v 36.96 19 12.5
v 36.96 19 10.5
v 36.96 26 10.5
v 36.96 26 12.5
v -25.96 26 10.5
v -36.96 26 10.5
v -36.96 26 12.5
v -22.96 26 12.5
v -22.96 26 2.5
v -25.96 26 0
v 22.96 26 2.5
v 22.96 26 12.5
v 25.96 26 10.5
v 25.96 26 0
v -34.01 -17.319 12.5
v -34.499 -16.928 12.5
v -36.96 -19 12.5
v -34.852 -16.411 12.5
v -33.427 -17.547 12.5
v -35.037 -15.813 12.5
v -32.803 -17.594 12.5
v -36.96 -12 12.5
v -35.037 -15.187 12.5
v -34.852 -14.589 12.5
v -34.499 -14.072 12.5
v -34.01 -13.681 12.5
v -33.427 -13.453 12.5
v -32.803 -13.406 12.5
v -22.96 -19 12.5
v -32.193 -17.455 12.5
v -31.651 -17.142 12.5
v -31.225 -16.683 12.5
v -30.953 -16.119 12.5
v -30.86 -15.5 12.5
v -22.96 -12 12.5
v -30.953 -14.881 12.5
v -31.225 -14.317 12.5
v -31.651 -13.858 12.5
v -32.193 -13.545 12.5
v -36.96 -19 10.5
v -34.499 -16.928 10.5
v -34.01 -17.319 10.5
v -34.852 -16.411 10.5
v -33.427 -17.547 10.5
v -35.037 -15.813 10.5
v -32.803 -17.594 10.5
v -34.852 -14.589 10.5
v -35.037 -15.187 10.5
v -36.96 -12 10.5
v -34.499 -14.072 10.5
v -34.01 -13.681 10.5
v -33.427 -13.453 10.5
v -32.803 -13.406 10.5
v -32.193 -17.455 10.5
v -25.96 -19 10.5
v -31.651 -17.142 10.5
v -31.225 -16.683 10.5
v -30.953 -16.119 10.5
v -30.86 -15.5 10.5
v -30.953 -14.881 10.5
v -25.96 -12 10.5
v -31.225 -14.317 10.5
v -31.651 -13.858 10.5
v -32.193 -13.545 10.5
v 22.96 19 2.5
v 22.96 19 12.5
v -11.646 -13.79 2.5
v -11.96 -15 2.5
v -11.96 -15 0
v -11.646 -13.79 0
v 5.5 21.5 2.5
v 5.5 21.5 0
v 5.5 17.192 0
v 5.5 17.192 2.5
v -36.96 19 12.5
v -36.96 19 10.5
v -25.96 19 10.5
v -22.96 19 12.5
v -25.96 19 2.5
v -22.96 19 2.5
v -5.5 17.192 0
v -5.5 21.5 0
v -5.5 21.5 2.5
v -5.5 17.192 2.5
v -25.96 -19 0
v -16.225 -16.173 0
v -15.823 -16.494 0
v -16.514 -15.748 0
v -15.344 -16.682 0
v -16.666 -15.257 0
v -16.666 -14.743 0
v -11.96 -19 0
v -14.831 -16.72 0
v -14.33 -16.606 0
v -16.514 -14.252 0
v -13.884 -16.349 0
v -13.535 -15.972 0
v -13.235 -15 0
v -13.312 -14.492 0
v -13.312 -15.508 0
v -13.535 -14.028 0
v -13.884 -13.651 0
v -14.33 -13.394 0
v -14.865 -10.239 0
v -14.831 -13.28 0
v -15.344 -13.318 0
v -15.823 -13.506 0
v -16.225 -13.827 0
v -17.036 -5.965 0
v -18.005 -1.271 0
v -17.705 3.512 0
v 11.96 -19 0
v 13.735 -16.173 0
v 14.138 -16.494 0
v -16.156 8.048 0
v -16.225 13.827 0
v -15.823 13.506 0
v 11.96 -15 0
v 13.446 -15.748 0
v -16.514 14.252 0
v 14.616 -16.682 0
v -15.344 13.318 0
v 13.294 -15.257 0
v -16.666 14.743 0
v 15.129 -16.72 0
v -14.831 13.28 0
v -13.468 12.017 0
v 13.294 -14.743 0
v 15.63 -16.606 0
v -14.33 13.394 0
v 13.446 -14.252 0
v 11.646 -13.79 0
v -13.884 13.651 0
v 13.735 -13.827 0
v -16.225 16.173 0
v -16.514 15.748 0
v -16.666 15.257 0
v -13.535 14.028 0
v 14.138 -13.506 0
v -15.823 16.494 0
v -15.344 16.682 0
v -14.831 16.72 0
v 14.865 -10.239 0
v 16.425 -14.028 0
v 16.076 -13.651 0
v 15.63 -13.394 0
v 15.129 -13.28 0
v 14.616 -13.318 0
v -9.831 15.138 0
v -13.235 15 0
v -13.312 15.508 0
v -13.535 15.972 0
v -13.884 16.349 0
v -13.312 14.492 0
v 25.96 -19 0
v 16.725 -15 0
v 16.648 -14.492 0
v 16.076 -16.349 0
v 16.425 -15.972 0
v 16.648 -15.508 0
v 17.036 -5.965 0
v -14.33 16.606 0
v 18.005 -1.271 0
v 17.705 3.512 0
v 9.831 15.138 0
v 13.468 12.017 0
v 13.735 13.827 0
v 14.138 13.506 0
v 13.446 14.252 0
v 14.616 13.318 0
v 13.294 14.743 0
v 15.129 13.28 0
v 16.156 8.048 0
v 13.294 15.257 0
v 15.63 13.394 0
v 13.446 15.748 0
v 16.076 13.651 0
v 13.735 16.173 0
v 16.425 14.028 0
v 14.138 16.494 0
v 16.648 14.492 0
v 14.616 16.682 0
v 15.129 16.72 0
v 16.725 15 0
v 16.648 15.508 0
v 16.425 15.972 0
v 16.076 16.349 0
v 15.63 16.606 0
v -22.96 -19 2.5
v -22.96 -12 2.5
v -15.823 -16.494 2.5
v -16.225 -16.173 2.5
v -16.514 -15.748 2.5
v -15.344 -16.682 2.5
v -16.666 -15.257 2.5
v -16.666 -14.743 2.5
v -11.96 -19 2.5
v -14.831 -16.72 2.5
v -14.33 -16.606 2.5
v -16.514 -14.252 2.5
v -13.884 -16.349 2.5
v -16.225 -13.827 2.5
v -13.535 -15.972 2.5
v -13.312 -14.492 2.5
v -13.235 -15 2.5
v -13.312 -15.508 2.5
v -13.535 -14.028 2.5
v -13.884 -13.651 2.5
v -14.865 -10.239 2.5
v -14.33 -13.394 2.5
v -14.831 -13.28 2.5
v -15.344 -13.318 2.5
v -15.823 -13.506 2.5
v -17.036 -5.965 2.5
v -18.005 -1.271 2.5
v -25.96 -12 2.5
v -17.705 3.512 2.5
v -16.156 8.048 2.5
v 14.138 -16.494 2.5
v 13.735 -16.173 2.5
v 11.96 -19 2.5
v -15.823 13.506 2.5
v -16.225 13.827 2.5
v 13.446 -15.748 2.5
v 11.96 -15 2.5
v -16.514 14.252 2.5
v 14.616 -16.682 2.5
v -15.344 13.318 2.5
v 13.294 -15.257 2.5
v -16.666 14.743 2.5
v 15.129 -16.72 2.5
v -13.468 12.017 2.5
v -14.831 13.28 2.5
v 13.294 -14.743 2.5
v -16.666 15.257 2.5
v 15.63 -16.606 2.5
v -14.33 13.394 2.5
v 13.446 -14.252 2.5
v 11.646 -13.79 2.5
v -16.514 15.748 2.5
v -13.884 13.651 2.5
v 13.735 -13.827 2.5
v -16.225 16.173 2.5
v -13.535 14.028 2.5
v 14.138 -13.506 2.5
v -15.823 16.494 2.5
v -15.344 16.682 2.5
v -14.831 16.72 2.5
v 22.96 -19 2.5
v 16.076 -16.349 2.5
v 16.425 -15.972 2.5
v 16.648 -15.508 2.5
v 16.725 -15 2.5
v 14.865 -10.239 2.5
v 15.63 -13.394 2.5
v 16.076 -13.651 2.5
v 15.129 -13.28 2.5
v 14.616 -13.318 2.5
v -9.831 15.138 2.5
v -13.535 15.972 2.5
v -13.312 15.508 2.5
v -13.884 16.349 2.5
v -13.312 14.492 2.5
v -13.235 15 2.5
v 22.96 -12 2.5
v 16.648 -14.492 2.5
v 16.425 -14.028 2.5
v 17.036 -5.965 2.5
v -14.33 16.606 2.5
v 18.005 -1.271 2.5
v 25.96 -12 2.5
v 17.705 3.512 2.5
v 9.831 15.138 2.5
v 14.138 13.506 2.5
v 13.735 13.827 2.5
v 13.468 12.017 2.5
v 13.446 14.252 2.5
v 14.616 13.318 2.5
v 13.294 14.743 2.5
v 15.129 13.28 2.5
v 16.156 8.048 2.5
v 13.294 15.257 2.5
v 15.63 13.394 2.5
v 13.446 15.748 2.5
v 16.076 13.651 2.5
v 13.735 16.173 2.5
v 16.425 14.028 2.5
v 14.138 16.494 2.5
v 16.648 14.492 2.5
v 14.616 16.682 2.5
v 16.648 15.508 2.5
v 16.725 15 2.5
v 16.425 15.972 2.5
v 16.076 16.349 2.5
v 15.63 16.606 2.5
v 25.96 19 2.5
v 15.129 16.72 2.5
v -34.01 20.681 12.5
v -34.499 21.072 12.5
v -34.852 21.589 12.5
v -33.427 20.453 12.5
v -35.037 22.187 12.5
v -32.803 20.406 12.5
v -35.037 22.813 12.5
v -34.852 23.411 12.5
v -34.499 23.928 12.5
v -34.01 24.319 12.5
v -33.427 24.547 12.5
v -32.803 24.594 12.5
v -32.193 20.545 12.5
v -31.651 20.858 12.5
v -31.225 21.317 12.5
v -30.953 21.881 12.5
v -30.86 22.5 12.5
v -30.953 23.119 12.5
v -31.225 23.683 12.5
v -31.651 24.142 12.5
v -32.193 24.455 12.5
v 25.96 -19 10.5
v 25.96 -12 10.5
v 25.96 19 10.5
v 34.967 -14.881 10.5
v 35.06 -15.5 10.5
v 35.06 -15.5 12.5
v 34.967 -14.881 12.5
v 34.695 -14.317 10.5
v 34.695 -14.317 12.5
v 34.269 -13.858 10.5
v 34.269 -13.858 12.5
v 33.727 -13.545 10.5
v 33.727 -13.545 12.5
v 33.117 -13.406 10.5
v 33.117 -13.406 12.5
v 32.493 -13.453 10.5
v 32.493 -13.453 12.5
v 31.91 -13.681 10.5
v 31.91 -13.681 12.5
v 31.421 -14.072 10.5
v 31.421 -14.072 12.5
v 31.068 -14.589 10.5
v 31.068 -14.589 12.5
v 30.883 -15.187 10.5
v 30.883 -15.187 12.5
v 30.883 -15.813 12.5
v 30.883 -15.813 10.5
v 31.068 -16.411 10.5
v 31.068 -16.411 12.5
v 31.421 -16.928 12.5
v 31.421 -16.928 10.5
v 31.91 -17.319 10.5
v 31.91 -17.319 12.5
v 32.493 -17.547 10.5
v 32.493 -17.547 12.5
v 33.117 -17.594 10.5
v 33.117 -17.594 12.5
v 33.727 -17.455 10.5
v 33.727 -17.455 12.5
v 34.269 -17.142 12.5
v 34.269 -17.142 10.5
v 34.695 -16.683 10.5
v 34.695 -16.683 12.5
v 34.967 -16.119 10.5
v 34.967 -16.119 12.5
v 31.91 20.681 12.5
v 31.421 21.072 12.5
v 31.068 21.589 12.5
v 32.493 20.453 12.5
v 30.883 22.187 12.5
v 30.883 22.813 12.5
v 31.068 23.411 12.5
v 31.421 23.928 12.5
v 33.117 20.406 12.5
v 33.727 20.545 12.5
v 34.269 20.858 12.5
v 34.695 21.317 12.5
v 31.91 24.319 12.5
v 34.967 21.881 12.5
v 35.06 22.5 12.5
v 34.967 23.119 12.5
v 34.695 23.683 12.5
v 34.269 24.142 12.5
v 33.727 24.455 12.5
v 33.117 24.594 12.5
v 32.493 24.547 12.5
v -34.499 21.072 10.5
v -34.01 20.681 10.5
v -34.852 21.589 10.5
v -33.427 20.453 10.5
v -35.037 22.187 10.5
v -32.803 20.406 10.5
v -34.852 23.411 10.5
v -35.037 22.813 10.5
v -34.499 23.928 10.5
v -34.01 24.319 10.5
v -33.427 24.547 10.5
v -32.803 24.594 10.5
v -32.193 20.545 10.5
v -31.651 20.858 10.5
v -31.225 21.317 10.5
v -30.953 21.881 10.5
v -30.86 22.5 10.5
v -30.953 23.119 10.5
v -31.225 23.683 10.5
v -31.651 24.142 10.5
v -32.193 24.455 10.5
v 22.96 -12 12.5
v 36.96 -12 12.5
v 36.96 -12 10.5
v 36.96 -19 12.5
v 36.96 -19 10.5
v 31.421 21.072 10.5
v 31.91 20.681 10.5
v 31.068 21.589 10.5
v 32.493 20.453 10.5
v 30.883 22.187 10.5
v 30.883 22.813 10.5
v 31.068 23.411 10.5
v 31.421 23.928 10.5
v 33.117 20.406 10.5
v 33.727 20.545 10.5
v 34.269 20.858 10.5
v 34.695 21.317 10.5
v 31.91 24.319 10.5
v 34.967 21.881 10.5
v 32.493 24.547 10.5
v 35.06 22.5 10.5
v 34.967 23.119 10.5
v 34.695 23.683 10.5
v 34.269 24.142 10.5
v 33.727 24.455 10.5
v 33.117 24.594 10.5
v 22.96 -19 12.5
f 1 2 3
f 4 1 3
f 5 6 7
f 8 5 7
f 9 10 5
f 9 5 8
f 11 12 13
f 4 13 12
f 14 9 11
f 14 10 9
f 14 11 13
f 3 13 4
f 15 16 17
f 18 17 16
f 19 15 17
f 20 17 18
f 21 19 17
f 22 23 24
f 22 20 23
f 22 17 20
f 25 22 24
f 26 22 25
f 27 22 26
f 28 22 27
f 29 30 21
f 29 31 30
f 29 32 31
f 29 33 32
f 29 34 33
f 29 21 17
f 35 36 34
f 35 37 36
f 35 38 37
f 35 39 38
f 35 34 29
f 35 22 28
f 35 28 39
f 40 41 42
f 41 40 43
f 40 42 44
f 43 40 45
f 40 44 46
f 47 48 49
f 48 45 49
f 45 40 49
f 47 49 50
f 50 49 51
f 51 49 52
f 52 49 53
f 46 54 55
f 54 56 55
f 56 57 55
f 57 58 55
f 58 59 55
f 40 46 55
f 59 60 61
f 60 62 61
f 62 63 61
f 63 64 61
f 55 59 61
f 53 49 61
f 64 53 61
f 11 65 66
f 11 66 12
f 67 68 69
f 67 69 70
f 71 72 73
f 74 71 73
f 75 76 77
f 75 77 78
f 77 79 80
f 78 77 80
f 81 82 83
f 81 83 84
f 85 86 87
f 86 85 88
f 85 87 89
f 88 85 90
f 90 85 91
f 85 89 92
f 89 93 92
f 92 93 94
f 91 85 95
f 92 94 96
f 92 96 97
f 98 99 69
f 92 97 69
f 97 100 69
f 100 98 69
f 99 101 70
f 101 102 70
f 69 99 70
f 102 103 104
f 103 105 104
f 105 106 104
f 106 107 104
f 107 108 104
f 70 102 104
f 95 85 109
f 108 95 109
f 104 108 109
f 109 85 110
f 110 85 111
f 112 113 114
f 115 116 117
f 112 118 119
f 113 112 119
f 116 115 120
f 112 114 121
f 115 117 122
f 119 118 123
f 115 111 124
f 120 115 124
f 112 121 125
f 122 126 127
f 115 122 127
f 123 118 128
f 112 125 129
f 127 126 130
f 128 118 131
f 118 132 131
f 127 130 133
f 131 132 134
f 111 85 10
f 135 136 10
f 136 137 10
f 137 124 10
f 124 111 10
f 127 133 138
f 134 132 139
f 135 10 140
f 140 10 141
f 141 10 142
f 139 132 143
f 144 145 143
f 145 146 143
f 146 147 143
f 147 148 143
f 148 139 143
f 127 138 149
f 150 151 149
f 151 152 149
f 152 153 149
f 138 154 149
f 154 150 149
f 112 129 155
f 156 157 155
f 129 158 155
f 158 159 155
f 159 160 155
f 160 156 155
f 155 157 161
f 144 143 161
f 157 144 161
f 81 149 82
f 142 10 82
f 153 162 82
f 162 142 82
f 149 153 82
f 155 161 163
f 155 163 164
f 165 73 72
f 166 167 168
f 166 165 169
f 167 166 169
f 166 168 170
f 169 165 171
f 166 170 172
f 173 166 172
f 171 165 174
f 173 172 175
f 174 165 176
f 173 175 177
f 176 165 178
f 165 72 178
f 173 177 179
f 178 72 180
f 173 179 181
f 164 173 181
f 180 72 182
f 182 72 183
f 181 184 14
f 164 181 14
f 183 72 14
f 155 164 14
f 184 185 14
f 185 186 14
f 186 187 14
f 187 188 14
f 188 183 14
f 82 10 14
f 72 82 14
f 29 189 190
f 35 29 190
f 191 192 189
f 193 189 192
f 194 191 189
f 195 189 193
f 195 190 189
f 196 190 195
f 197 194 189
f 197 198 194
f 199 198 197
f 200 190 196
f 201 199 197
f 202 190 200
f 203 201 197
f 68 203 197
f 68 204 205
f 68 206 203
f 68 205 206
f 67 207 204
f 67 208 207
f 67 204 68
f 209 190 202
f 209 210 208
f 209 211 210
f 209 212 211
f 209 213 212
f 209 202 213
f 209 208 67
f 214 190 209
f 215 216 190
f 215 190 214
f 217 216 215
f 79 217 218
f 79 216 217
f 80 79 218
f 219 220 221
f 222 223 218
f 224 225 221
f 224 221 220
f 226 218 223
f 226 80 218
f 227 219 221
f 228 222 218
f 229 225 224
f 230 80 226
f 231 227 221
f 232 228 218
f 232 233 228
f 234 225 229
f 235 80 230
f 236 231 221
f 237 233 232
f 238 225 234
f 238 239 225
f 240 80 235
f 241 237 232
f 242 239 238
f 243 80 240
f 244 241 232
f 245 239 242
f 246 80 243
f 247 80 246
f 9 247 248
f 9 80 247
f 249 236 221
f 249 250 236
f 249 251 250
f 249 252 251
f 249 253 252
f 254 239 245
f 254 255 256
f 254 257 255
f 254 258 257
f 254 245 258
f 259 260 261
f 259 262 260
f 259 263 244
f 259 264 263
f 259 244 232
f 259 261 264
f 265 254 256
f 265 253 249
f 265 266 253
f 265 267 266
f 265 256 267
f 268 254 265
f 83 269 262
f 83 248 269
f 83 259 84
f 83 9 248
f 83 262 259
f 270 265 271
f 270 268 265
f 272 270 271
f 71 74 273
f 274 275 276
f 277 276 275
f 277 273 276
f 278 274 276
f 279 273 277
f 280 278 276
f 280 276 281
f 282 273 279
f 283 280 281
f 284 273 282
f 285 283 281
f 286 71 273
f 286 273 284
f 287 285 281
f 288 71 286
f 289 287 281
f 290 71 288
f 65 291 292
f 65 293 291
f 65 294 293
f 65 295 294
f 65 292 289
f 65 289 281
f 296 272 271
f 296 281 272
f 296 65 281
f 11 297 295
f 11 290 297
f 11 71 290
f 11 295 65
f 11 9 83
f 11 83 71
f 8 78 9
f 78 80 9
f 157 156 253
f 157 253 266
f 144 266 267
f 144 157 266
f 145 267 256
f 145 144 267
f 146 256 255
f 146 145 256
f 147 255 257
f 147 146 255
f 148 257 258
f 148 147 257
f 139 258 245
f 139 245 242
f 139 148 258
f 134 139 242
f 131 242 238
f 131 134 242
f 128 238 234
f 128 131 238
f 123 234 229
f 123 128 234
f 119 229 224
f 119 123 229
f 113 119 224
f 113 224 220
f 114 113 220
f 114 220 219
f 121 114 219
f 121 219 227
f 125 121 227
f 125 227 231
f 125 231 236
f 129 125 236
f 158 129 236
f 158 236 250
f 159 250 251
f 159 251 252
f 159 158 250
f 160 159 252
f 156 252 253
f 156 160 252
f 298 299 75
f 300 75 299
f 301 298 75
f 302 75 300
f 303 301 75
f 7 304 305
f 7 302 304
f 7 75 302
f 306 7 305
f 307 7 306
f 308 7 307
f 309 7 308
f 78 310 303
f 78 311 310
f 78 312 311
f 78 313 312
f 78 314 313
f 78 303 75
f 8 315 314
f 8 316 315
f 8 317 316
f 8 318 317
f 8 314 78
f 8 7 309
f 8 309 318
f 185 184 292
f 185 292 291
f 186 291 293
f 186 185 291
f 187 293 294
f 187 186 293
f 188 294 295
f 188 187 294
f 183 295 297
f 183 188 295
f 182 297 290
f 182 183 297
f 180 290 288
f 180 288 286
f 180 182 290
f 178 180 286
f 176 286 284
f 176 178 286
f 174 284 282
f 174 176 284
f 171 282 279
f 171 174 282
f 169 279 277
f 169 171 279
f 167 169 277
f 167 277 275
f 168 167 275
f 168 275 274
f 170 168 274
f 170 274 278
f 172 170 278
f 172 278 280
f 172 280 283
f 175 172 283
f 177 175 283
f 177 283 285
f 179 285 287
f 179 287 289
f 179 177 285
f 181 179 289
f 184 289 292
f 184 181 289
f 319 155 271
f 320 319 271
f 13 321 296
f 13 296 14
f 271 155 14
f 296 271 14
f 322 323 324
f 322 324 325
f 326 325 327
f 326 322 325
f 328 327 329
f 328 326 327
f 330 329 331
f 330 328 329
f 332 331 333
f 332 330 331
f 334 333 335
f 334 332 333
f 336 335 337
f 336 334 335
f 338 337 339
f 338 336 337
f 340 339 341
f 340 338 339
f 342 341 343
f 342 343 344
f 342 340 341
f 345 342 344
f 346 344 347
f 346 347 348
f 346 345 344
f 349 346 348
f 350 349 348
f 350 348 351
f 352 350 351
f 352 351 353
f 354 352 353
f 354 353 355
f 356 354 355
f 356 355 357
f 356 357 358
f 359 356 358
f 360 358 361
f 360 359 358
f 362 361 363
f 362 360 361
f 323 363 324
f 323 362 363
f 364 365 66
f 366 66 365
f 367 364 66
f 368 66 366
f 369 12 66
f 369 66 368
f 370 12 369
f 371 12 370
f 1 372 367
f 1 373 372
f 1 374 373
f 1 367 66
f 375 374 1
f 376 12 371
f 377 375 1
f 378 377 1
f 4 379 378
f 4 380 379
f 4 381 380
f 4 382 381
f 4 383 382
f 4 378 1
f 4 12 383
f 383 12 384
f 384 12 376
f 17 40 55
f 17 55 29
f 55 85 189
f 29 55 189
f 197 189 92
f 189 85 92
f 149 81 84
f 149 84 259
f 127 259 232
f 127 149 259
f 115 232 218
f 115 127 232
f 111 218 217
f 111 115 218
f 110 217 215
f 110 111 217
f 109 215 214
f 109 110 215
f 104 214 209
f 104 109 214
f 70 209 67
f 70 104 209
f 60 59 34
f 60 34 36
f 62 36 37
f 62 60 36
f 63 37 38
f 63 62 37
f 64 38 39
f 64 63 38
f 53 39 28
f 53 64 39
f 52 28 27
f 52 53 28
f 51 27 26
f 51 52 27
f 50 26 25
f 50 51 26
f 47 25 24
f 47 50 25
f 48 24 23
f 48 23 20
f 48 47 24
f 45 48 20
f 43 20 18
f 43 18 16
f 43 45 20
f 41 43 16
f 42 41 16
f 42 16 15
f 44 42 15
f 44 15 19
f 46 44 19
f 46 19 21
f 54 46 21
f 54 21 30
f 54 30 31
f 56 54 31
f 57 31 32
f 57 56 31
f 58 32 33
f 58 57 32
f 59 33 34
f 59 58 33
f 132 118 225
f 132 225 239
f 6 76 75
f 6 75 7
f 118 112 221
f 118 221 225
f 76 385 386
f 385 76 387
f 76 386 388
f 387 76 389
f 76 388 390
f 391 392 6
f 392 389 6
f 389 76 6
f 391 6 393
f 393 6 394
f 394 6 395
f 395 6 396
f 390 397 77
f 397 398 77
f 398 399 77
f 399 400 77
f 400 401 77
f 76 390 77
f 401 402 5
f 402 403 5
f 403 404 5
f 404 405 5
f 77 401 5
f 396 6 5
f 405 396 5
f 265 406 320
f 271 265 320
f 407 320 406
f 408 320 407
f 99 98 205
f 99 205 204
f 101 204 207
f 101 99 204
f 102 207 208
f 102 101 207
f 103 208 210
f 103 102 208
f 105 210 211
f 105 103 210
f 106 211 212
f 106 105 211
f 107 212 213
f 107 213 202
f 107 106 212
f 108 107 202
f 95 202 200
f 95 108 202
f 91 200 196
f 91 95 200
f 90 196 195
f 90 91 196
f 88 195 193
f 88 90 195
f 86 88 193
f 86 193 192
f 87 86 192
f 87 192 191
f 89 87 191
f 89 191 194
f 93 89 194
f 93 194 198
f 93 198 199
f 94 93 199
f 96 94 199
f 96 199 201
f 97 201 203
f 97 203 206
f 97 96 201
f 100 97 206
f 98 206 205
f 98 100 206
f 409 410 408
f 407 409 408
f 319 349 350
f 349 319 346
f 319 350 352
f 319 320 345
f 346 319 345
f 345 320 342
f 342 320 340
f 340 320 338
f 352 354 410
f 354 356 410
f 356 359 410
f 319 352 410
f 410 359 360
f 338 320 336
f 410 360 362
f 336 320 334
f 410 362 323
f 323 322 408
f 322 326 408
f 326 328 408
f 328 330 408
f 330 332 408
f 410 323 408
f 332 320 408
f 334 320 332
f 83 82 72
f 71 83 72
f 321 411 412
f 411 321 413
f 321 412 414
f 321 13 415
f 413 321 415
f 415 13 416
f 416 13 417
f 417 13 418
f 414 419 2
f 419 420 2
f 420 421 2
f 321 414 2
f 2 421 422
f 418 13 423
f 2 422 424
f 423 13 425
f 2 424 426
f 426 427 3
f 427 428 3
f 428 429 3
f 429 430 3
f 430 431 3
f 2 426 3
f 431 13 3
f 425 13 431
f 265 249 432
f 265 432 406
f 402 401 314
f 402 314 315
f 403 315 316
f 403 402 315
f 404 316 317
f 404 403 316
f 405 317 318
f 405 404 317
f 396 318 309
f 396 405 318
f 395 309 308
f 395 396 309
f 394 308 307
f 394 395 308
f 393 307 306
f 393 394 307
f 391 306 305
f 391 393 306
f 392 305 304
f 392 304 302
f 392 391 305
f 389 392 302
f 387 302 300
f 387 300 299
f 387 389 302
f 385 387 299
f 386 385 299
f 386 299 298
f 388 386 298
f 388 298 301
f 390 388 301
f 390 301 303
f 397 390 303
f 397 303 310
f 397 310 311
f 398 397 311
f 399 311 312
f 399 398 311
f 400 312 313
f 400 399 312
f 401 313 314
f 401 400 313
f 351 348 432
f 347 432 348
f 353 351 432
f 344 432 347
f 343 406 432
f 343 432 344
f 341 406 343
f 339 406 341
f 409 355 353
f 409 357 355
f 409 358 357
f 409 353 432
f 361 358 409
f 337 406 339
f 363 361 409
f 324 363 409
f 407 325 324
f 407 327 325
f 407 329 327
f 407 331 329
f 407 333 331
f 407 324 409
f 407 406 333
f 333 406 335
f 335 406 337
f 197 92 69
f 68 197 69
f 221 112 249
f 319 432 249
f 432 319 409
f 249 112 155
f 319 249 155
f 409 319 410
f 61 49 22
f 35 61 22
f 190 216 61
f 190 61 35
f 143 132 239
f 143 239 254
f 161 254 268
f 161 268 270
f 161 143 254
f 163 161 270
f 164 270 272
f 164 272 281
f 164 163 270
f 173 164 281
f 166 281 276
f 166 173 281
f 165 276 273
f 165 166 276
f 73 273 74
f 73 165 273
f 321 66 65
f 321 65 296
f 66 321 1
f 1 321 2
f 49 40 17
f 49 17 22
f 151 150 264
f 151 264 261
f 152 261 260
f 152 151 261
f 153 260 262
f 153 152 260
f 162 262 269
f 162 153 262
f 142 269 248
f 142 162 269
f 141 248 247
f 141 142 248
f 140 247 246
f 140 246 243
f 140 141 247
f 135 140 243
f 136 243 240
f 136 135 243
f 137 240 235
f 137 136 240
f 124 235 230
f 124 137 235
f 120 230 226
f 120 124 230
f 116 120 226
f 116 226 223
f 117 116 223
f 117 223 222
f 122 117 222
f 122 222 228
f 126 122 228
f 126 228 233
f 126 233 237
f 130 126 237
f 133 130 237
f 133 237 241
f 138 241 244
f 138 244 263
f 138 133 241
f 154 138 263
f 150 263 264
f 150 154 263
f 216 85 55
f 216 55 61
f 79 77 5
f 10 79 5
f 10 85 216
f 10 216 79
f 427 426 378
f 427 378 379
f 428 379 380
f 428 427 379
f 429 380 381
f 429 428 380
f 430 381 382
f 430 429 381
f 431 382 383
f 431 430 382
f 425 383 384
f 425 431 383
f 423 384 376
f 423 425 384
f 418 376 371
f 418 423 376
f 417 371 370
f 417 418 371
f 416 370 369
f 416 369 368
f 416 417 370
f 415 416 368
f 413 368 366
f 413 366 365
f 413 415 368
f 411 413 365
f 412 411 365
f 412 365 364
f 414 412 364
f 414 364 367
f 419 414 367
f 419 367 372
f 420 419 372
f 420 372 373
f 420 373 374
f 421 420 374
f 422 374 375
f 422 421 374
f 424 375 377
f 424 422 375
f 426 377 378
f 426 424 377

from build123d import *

# Parameters (mm, degrees)
SKETCH_R     = 1.725
PAD_DEPTH    = 2.5
SKETCH002_W  = 3
SKETCH002_H  = 7
PAD001_DEPTH = 8
SKETCH003_W  = 14
SKETCH003_H  = 7
SKETCH003_R  = 2.1
PAD002_DEPTH = 2


with BuildPart() as part:
    # Sketch → Pad (new body)
    with BuildSketch(Plane.XY):
        with BuildLine():
            Line((-19.96, -19), (-11.96, -19))
            Line((-11.96, -19), (-11.96, -15))
            Line((-11.96, -15), (-11.646424, -13.789971))
            ThreePointArc((-5.5, 17.19164), (-17.704944, 3.512474), (-11.646424, -13.789971))
            Line((-5.5, 21.5), (-5.5, 17.19164))
            Line((-5.5, 21.5), (5.5, 21.5))
            Line((5.5, 21.5), (5.5, 17.19164))
            ThreePointArc((11.646424, -13.789971), (17.704944, 3.512474), (5.5, 17.19164))
            Line((11.96, -15), (11.646424, -13.789971))
            Line((11.96, -19), (11.96, -15))
            Line((11.96, -19), (20.04, -19))
            Line((20.04, -19), (25.96, -19))
            Line((25.96, -19), (25.96, 26))
            Line((25.96, 26), (20, 26))
            Line((-20, 26), (20, 26))
            Line((-20, 26), (-25.96, 26))
            Line((-25.96, 26), (-25.96, -19))
            Line((-19.96, -19), (-25.96, -19))
        make_face()
        with Locations((-14.96, 15)):
            Circle(SKETCH_R, mode=Mode.SUBTRACT)
        with Locations((15, 15)):
            Circle(SKETCH_R, mode=Mode.SUBTRACT)
        with Locations((-14.96, -15)):
            Circle(SKETCH_R, mode=Mode.SUBTRACT)
        with Locations((15, -15)):
            Circle(SKETCH_R, mode=Mode.SUBTRACT)
    extrude(amount=PAD_DEPTH)

    # Sketch002 (on Face24 of Pad) → Pad001 (join)
    with BuildSketch(Plane.XY.offset(2.5)):
        with Locations((-24.46, 22.5)):
            Rectangle(SKETCH002_W, SKETCH002_H)
        with Locations((-24.46, -15.5)):
            Rectangle(SKETCH002_W, SKETCH002_H)
        with Locations((24.46, -15.5)):
            Rectangle(SKETCH002_W, SKETCH002_H)
        with Locations((24.46, 22.5)):
            Rectangle(SKETCH002_W, SKETCH002_H)
    extrude(amount=PAD001_DEPTH)

    # Sketch003 (on Face25 of Pad001) → Pad002 (join)
    with BuildSketch(Plane.XY.offset(10.5)):
        with Locations((-29.96, 22.5)):
            Rectangle(SKETCH003_W, SKETCH003_H)
        with Locations((-32.96, 22.5)):
            Circle(SKETCH003_R, mode=Mode.SUBTRACT)
        with Locations((-29.96, -15.5)):
            Rectangle(SKETCH003_W, SKETCH003_H)
        with Locations((-32.96, -15.5)):
            Circle(SKETCH003_R, mode=Mode.SUBTRACT)
        with Locations((29.96, -15.5)):
            Rectangle(SKETCH003_W, SKETCH003_H)
        with Locations((32.96, -15.5)):
            Circle(SKETCH003_R, mode=Mode.SUBTRACT)
        with Locations((29.96, 22.5)):
            Rectangle(SKETCH003_W, SKETCH003_H)
        with Locations((32.96, 22.5)):
            Circle(SKETCH003_R, mode=Mode.SUBTRACT)
    extrude(amount=PAD002_DEPTH)


solid = part.part
